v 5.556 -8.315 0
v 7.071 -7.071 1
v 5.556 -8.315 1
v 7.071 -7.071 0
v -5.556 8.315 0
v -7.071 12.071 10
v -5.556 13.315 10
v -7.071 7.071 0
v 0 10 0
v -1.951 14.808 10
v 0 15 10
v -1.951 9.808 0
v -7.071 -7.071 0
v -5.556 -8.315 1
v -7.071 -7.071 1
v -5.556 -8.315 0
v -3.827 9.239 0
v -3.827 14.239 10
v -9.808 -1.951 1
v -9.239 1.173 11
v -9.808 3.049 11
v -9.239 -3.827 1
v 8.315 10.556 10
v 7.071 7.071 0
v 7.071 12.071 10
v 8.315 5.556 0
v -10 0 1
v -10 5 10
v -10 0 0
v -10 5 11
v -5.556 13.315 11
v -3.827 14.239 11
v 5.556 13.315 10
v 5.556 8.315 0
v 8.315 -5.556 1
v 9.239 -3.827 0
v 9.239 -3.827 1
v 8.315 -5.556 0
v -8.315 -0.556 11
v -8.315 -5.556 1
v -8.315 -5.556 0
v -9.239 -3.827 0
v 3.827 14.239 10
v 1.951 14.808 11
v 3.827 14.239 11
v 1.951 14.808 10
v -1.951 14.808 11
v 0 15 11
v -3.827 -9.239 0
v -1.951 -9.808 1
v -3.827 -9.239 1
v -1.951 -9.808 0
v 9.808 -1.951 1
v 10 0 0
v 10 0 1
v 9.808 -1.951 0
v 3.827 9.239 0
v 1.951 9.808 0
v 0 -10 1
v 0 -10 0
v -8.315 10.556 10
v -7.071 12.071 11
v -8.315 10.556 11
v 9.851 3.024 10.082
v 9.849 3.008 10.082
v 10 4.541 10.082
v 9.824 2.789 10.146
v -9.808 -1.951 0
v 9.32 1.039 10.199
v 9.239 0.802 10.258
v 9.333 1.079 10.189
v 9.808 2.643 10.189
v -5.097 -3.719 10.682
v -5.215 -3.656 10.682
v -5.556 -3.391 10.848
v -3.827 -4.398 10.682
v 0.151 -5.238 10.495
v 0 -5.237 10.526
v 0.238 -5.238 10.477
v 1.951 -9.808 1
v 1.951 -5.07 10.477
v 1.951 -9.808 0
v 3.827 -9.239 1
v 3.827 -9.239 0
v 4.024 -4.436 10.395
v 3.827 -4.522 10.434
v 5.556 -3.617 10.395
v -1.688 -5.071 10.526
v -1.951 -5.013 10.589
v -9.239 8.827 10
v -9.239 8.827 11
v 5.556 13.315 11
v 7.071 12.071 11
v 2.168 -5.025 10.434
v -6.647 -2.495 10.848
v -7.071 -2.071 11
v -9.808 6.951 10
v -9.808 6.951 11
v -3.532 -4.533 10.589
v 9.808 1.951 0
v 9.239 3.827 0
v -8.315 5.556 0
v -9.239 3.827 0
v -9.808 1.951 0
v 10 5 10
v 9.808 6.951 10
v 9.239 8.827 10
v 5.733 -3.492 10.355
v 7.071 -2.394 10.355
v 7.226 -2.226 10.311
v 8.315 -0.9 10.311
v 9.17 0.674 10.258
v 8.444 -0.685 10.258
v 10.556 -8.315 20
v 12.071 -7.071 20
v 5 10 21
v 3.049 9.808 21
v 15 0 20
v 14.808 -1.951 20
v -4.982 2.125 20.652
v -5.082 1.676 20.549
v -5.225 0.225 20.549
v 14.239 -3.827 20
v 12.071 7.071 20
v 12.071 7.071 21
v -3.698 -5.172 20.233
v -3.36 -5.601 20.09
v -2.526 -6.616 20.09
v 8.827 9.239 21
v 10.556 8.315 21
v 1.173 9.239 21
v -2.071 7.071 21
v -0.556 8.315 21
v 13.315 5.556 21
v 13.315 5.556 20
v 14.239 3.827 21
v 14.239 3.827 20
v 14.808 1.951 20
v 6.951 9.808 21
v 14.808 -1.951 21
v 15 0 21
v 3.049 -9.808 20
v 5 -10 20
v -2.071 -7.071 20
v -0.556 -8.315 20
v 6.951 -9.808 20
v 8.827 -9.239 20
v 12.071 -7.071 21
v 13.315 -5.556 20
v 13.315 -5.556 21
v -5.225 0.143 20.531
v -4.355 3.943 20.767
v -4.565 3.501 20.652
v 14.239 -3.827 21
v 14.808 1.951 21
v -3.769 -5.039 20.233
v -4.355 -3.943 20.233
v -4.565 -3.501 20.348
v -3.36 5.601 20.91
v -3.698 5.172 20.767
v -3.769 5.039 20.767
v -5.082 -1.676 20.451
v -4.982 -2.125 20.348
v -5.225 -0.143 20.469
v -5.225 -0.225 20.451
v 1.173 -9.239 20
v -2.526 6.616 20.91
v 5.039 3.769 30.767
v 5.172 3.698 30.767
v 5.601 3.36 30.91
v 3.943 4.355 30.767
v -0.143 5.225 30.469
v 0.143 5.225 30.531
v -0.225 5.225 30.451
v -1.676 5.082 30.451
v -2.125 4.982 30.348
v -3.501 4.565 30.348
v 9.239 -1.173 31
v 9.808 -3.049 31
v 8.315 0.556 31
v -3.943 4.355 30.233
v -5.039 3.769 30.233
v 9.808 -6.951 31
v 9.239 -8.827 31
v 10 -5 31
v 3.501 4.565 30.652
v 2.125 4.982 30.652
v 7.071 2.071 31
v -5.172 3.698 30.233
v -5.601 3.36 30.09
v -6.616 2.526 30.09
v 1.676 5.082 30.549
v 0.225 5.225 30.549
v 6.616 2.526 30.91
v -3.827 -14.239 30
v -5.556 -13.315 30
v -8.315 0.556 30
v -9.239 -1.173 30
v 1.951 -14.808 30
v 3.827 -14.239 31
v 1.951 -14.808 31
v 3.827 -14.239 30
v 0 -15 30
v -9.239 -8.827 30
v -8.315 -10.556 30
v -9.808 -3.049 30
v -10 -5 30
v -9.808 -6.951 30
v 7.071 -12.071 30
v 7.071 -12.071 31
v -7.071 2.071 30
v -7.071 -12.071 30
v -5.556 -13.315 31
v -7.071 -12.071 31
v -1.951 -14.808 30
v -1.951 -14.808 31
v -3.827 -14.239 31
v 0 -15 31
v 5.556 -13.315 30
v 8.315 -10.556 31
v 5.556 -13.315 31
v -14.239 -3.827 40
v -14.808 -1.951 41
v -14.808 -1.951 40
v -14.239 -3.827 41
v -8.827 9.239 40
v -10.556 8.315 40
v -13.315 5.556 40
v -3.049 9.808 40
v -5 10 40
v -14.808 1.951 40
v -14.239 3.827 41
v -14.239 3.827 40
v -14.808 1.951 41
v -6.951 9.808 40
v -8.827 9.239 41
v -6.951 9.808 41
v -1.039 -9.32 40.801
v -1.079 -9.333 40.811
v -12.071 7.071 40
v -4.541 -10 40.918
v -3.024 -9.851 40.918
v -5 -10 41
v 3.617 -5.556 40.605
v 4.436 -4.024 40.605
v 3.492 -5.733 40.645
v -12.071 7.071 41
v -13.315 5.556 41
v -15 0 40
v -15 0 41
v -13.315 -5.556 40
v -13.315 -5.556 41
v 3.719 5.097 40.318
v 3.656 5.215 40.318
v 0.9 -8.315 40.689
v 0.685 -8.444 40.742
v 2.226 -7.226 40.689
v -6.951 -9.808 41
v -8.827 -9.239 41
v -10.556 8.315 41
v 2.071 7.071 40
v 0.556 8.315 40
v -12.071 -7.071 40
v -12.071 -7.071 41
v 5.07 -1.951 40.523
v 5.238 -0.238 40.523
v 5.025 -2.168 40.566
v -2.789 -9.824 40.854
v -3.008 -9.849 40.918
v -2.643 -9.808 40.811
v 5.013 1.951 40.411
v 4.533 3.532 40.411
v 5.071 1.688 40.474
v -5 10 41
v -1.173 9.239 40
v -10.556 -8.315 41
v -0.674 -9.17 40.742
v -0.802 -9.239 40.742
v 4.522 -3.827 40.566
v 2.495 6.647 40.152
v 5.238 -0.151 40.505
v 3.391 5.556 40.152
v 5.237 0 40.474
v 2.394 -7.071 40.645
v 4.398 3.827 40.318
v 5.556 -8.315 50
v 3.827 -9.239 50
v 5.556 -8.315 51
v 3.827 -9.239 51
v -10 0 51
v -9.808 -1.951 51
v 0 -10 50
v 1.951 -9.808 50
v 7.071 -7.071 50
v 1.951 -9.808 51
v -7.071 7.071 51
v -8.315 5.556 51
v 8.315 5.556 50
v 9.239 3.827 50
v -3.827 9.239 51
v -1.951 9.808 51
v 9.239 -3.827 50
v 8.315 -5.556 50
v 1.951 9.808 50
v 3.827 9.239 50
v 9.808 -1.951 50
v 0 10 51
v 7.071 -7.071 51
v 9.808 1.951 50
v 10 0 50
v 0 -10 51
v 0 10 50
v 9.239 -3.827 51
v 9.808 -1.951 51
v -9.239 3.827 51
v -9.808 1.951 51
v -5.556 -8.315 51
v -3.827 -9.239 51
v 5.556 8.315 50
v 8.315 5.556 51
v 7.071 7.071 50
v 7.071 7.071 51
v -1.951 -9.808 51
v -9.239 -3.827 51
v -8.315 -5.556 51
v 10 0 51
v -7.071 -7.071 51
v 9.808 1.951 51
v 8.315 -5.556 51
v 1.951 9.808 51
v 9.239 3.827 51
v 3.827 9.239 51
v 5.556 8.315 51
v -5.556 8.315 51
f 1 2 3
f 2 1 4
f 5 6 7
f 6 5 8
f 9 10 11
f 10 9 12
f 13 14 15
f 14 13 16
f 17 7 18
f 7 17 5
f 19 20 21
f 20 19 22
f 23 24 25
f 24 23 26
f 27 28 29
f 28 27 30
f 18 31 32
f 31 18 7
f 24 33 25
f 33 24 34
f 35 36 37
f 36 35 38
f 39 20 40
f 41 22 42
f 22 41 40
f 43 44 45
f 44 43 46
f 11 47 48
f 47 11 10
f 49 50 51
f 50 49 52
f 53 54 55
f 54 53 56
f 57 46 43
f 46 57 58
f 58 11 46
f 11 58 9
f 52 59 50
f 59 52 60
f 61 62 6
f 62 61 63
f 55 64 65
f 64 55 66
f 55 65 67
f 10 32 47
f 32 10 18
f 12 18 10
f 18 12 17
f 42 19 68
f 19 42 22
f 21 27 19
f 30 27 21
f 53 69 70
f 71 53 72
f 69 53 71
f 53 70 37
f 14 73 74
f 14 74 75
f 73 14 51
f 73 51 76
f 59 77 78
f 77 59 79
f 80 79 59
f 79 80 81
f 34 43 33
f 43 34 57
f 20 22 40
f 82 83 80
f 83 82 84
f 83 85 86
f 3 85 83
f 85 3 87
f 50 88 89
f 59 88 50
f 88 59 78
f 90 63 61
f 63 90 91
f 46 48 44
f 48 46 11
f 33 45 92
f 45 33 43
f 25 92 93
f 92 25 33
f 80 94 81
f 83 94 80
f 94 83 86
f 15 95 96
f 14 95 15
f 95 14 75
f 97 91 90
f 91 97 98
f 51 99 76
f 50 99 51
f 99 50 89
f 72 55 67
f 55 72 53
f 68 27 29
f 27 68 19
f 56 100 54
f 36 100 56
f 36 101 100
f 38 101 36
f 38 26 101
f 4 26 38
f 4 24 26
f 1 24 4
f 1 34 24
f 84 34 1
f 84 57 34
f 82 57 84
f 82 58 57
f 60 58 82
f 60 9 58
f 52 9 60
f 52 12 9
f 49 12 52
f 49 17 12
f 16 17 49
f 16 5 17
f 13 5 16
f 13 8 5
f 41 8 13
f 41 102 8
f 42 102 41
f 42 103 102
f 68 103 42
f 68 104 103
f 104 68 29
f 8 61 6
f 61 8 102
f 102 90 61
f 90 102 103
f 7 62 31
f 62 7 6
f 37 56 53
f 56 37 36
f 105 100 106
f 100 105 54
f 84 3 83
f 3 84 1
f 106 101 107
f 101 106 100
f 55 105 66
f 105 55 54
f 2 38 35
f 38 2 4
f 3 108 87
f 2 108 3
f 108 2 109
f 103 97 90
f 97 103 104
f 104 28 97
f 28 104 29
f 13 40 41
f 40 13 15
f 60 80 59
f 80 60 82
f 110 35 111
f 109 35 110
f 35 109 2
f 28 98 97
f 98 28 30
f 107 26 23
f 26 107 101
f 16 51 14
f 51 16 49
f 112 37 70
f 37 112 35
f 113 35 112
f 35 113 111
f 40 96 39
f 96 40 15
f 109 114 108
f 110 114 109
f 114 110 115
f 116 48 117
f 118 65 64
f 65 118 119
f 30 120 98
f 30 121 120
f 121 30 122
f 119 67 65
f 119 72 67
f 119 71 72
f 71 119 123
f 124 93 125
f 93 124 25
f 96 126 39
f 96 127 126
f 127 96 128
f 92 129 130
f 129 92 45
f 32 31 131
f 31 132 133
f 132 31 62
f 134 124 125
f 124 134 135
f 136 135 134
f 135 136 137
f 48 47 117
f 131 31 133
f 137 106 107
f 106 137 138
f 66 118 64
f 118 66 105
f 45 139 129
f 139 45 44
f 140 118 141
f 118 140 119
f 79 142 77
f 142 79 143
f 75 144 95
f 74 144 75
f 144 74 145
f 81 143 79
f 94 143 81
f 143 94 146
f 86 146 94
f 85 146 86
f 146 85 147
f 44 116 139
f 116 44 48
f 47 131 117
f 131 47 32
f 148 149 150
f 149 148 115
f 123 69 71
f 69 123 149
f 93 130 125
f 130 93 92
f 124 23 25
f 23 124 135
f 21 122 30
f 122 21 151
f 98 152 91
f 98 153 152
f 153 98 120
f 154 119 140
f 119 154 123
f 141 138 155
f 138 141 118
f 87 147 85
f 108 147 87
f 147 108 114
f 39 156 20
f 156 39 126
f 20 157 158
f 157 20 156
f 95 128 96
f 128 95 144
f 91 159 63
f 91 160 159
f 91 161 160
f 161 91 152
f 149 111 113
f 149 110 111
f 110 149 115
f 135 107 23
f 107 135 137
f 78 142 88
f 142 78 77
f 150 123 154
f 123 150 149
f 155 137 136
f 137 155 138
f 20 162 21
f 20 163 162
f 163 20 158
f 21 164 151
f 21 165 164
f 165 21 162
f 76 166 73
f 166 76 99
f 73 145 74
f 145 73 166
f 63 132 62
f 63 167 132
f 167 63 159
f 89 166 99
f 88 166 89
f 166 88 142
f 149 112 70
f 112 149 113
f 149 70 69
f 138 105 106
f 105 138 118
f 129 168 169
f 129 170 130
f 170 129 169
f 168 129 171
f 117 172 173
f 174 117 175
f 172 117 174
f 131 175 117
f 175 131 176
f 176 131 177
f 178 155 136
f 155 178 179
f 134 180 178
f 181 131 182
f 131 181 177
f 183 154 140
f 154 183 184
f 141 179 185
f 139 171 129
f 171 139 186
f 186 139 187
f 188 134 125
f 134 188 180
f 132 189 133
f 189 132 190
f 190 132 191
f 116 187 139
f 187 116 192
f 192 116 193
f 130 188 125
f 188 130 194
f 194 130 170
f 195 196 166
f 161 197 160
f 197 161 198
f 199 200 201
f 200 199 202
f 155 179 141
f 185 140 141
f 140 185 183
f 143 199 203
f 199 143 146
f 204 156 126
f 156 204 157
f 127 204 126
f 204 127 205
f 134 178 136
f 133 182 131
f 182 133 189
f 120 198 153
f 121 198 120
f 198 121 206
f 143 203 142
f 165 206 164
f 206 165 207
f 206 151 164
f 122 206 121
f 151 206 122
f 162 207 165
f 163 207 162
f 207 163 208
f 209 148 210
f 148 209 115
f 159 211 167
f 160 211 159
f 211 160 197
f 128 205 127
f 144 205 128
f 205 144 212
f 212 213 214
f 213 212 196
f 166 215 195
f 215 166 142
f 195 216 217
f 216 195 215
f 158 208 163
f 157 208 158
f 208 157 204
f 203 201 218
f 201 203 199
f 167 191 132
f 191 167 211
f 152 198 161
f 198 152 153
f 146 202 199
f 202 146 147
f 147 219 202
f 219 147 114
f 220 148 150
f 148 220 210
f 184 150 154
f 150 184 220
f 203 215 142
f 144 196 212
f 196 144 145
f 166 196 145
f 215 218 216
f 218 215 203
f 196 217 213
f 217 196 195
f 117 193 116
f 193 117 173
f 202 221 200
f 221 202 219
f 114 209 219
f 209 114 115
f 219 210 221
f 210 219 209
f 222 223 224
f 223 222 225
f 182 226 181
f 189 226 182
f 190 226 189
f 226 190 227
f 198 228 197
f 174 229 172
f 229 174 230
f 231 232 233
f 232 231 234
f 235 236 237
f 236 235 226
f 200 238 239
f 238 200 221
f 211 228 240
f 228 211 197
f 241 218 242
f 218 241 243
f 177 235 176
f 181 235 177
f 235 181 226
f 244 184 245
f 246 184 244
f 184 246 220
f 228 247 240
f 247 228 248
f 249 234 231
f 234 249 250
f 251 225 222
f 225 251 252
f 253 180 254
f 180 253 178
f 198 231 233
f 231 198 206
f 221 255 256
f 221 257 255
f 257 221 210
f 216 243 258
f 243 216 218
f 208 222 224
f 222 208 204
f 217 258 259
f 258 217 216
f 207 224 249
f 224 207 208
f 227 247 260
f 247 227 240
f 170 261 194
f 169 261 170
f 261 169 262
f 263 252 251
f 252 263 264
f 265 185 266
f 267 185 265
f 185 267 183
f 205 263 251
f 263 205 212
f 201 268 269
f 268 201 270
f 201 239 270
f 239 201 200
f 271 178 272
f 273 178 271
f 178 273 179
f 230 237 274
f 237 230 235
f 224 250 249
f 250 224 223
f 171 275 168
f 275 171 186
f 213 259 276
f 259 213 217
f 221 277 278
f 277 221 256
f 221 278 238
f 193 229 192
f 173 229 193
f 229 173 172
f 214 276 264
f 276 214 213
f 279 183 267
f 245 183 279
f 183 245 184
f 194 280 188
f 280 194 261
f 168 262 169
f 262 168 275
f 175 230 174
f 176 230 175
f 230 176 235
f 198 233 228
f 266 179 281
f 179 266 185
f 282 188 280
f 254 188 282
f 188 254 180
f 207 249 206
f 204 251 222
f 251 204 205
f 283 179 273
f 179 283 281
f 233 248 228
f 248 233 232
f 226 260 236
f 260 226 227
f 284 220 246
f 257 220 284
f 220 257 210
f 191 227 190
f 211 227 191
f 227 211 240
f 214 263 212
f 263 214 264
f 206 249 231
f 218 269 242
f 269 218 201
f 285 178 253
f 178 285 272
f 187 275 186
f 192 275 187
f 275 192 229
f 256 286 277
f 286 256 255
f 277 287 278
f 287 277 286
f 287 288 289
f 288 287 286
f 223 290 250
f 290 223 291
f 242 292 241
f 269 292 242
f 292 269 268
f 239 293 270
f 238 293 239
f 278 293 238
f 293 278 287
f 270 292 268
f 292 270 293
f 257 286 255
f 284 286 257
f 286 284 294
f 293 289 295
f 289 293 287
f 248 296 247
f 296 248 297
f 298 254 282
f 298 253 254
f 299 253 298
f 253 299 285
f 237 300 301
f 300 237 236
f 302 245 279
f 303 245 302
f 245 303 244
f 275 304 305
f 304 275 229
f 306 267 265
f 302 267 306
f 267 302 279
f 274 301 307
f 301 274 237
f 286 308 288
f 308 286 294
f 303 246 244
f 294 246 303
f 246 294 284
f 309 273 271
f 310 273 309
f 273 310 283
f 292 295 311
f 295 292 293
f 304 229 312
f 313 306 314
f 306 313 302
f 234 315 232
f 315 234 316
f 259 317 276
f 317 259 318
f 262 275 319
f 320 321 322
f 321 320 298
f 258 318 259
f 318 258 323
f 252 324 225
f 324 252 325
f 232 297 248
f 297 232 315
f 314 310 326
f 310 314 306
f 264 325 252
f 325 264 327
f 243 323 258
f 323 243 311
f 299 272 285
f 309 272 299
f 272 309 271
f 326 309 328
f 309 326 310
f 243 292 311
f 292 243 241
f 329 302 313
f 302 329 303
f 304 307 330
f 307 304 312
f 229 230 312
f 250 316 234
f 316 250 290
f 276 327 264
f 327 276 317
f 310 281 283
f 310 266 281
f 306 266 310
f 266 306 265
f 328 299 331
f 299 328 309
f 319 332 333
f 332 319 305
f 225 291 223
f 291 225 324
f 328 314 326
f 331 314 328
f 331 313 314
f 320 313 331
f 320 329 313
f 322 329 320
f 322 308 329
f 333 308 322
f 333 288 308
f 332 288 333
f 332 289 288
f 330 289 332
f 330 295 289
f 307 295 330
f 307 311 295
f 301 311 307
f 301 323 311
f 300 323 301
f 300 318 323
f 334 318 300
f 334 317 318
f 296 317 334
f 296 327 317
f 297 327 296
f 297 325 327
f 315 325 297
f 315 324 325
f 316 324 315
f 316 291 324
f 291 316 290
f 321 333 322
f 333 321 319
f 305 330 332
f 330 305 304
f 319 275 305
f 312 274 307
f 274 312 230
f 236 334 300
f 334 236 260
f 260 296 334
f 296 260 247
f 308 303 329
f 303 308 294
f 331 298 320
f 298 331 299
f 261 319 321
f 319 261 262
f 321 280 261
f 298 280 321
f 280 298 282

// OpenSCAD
$inch = 25.4;
$half = $inch/2;
$quarter = $inch/4;
$eigth = $inch/8;
$sixteenth = $inch/16;
$thirtysecondth = $inch/32;
$fn=32;

$2d = 0;
//--------------------------------------------------


//--------------------------------------------------
module make_screw() {
    union() {
       // section 1
       hull() {
		    translate([0,0,0]) {
		       rotate([0,0,0]) {
		          cylinder(r=10, h=1);
		       }
		    }
		    translate([0,5,10]) {
		       rotate([0,0,0]) {
		          cylinder(r=10, h=1);
		       }
		    }
       }
       // section 2
       hull() {
		    translate([0,5,10]) {
		       rotate([0,0,0]) {
		          cylinder(r=10, h=1);
		       }
		    }
		    translate([5,0,20]) {
		       rotate([0,0,0]) {
		          cylinder(r=10, h=1);
		       }
		    }
       }
       // section 3
       hull() {
		    translate([5,0,20]) {
		       rotate([0,0,0]) {
		          cylinder(r=10, h=1);
		       }
		    }
		    translate([0,-5,30]) {
		       rotate([0,0,0]) {
		          cylinder(r=10, h=1);
		       }
		    }
       }
       // section 4
       hull() {
		    translate([0,-5,30]) {
		       rotate([0,0,0]) {
		          cylinder(r=10, h=1);
		       }
		    }
		    translate([-5,0,40]) {
		       rotate([0,0,0]) {
		          cylinder(r=10, h=1);
		       }
		    }
       }
       // section 5
       hull() {
		    translate([-5,0,40]) {
		       rotate([0,0,0]) {
		          cylinder(r=10, h=1);
		       }
		    }
		    translate([0,0,50]) {
		       rotate([0,0,0]) {
		          cylinder(r=10, h=1);
		       }
		    }
       }
    }
}



module make_parts() {
  make_screw();
}

//--------------------------------------------------
if ($2d) {
    projection(cut=true) {
       translate([0,0,0]) rotate([0,0,0]) {
          make_parts();
       }
    }
} else {
   translate([0,0,0]) rotate([0,0,0]) {
      make_parts();
   }
}
